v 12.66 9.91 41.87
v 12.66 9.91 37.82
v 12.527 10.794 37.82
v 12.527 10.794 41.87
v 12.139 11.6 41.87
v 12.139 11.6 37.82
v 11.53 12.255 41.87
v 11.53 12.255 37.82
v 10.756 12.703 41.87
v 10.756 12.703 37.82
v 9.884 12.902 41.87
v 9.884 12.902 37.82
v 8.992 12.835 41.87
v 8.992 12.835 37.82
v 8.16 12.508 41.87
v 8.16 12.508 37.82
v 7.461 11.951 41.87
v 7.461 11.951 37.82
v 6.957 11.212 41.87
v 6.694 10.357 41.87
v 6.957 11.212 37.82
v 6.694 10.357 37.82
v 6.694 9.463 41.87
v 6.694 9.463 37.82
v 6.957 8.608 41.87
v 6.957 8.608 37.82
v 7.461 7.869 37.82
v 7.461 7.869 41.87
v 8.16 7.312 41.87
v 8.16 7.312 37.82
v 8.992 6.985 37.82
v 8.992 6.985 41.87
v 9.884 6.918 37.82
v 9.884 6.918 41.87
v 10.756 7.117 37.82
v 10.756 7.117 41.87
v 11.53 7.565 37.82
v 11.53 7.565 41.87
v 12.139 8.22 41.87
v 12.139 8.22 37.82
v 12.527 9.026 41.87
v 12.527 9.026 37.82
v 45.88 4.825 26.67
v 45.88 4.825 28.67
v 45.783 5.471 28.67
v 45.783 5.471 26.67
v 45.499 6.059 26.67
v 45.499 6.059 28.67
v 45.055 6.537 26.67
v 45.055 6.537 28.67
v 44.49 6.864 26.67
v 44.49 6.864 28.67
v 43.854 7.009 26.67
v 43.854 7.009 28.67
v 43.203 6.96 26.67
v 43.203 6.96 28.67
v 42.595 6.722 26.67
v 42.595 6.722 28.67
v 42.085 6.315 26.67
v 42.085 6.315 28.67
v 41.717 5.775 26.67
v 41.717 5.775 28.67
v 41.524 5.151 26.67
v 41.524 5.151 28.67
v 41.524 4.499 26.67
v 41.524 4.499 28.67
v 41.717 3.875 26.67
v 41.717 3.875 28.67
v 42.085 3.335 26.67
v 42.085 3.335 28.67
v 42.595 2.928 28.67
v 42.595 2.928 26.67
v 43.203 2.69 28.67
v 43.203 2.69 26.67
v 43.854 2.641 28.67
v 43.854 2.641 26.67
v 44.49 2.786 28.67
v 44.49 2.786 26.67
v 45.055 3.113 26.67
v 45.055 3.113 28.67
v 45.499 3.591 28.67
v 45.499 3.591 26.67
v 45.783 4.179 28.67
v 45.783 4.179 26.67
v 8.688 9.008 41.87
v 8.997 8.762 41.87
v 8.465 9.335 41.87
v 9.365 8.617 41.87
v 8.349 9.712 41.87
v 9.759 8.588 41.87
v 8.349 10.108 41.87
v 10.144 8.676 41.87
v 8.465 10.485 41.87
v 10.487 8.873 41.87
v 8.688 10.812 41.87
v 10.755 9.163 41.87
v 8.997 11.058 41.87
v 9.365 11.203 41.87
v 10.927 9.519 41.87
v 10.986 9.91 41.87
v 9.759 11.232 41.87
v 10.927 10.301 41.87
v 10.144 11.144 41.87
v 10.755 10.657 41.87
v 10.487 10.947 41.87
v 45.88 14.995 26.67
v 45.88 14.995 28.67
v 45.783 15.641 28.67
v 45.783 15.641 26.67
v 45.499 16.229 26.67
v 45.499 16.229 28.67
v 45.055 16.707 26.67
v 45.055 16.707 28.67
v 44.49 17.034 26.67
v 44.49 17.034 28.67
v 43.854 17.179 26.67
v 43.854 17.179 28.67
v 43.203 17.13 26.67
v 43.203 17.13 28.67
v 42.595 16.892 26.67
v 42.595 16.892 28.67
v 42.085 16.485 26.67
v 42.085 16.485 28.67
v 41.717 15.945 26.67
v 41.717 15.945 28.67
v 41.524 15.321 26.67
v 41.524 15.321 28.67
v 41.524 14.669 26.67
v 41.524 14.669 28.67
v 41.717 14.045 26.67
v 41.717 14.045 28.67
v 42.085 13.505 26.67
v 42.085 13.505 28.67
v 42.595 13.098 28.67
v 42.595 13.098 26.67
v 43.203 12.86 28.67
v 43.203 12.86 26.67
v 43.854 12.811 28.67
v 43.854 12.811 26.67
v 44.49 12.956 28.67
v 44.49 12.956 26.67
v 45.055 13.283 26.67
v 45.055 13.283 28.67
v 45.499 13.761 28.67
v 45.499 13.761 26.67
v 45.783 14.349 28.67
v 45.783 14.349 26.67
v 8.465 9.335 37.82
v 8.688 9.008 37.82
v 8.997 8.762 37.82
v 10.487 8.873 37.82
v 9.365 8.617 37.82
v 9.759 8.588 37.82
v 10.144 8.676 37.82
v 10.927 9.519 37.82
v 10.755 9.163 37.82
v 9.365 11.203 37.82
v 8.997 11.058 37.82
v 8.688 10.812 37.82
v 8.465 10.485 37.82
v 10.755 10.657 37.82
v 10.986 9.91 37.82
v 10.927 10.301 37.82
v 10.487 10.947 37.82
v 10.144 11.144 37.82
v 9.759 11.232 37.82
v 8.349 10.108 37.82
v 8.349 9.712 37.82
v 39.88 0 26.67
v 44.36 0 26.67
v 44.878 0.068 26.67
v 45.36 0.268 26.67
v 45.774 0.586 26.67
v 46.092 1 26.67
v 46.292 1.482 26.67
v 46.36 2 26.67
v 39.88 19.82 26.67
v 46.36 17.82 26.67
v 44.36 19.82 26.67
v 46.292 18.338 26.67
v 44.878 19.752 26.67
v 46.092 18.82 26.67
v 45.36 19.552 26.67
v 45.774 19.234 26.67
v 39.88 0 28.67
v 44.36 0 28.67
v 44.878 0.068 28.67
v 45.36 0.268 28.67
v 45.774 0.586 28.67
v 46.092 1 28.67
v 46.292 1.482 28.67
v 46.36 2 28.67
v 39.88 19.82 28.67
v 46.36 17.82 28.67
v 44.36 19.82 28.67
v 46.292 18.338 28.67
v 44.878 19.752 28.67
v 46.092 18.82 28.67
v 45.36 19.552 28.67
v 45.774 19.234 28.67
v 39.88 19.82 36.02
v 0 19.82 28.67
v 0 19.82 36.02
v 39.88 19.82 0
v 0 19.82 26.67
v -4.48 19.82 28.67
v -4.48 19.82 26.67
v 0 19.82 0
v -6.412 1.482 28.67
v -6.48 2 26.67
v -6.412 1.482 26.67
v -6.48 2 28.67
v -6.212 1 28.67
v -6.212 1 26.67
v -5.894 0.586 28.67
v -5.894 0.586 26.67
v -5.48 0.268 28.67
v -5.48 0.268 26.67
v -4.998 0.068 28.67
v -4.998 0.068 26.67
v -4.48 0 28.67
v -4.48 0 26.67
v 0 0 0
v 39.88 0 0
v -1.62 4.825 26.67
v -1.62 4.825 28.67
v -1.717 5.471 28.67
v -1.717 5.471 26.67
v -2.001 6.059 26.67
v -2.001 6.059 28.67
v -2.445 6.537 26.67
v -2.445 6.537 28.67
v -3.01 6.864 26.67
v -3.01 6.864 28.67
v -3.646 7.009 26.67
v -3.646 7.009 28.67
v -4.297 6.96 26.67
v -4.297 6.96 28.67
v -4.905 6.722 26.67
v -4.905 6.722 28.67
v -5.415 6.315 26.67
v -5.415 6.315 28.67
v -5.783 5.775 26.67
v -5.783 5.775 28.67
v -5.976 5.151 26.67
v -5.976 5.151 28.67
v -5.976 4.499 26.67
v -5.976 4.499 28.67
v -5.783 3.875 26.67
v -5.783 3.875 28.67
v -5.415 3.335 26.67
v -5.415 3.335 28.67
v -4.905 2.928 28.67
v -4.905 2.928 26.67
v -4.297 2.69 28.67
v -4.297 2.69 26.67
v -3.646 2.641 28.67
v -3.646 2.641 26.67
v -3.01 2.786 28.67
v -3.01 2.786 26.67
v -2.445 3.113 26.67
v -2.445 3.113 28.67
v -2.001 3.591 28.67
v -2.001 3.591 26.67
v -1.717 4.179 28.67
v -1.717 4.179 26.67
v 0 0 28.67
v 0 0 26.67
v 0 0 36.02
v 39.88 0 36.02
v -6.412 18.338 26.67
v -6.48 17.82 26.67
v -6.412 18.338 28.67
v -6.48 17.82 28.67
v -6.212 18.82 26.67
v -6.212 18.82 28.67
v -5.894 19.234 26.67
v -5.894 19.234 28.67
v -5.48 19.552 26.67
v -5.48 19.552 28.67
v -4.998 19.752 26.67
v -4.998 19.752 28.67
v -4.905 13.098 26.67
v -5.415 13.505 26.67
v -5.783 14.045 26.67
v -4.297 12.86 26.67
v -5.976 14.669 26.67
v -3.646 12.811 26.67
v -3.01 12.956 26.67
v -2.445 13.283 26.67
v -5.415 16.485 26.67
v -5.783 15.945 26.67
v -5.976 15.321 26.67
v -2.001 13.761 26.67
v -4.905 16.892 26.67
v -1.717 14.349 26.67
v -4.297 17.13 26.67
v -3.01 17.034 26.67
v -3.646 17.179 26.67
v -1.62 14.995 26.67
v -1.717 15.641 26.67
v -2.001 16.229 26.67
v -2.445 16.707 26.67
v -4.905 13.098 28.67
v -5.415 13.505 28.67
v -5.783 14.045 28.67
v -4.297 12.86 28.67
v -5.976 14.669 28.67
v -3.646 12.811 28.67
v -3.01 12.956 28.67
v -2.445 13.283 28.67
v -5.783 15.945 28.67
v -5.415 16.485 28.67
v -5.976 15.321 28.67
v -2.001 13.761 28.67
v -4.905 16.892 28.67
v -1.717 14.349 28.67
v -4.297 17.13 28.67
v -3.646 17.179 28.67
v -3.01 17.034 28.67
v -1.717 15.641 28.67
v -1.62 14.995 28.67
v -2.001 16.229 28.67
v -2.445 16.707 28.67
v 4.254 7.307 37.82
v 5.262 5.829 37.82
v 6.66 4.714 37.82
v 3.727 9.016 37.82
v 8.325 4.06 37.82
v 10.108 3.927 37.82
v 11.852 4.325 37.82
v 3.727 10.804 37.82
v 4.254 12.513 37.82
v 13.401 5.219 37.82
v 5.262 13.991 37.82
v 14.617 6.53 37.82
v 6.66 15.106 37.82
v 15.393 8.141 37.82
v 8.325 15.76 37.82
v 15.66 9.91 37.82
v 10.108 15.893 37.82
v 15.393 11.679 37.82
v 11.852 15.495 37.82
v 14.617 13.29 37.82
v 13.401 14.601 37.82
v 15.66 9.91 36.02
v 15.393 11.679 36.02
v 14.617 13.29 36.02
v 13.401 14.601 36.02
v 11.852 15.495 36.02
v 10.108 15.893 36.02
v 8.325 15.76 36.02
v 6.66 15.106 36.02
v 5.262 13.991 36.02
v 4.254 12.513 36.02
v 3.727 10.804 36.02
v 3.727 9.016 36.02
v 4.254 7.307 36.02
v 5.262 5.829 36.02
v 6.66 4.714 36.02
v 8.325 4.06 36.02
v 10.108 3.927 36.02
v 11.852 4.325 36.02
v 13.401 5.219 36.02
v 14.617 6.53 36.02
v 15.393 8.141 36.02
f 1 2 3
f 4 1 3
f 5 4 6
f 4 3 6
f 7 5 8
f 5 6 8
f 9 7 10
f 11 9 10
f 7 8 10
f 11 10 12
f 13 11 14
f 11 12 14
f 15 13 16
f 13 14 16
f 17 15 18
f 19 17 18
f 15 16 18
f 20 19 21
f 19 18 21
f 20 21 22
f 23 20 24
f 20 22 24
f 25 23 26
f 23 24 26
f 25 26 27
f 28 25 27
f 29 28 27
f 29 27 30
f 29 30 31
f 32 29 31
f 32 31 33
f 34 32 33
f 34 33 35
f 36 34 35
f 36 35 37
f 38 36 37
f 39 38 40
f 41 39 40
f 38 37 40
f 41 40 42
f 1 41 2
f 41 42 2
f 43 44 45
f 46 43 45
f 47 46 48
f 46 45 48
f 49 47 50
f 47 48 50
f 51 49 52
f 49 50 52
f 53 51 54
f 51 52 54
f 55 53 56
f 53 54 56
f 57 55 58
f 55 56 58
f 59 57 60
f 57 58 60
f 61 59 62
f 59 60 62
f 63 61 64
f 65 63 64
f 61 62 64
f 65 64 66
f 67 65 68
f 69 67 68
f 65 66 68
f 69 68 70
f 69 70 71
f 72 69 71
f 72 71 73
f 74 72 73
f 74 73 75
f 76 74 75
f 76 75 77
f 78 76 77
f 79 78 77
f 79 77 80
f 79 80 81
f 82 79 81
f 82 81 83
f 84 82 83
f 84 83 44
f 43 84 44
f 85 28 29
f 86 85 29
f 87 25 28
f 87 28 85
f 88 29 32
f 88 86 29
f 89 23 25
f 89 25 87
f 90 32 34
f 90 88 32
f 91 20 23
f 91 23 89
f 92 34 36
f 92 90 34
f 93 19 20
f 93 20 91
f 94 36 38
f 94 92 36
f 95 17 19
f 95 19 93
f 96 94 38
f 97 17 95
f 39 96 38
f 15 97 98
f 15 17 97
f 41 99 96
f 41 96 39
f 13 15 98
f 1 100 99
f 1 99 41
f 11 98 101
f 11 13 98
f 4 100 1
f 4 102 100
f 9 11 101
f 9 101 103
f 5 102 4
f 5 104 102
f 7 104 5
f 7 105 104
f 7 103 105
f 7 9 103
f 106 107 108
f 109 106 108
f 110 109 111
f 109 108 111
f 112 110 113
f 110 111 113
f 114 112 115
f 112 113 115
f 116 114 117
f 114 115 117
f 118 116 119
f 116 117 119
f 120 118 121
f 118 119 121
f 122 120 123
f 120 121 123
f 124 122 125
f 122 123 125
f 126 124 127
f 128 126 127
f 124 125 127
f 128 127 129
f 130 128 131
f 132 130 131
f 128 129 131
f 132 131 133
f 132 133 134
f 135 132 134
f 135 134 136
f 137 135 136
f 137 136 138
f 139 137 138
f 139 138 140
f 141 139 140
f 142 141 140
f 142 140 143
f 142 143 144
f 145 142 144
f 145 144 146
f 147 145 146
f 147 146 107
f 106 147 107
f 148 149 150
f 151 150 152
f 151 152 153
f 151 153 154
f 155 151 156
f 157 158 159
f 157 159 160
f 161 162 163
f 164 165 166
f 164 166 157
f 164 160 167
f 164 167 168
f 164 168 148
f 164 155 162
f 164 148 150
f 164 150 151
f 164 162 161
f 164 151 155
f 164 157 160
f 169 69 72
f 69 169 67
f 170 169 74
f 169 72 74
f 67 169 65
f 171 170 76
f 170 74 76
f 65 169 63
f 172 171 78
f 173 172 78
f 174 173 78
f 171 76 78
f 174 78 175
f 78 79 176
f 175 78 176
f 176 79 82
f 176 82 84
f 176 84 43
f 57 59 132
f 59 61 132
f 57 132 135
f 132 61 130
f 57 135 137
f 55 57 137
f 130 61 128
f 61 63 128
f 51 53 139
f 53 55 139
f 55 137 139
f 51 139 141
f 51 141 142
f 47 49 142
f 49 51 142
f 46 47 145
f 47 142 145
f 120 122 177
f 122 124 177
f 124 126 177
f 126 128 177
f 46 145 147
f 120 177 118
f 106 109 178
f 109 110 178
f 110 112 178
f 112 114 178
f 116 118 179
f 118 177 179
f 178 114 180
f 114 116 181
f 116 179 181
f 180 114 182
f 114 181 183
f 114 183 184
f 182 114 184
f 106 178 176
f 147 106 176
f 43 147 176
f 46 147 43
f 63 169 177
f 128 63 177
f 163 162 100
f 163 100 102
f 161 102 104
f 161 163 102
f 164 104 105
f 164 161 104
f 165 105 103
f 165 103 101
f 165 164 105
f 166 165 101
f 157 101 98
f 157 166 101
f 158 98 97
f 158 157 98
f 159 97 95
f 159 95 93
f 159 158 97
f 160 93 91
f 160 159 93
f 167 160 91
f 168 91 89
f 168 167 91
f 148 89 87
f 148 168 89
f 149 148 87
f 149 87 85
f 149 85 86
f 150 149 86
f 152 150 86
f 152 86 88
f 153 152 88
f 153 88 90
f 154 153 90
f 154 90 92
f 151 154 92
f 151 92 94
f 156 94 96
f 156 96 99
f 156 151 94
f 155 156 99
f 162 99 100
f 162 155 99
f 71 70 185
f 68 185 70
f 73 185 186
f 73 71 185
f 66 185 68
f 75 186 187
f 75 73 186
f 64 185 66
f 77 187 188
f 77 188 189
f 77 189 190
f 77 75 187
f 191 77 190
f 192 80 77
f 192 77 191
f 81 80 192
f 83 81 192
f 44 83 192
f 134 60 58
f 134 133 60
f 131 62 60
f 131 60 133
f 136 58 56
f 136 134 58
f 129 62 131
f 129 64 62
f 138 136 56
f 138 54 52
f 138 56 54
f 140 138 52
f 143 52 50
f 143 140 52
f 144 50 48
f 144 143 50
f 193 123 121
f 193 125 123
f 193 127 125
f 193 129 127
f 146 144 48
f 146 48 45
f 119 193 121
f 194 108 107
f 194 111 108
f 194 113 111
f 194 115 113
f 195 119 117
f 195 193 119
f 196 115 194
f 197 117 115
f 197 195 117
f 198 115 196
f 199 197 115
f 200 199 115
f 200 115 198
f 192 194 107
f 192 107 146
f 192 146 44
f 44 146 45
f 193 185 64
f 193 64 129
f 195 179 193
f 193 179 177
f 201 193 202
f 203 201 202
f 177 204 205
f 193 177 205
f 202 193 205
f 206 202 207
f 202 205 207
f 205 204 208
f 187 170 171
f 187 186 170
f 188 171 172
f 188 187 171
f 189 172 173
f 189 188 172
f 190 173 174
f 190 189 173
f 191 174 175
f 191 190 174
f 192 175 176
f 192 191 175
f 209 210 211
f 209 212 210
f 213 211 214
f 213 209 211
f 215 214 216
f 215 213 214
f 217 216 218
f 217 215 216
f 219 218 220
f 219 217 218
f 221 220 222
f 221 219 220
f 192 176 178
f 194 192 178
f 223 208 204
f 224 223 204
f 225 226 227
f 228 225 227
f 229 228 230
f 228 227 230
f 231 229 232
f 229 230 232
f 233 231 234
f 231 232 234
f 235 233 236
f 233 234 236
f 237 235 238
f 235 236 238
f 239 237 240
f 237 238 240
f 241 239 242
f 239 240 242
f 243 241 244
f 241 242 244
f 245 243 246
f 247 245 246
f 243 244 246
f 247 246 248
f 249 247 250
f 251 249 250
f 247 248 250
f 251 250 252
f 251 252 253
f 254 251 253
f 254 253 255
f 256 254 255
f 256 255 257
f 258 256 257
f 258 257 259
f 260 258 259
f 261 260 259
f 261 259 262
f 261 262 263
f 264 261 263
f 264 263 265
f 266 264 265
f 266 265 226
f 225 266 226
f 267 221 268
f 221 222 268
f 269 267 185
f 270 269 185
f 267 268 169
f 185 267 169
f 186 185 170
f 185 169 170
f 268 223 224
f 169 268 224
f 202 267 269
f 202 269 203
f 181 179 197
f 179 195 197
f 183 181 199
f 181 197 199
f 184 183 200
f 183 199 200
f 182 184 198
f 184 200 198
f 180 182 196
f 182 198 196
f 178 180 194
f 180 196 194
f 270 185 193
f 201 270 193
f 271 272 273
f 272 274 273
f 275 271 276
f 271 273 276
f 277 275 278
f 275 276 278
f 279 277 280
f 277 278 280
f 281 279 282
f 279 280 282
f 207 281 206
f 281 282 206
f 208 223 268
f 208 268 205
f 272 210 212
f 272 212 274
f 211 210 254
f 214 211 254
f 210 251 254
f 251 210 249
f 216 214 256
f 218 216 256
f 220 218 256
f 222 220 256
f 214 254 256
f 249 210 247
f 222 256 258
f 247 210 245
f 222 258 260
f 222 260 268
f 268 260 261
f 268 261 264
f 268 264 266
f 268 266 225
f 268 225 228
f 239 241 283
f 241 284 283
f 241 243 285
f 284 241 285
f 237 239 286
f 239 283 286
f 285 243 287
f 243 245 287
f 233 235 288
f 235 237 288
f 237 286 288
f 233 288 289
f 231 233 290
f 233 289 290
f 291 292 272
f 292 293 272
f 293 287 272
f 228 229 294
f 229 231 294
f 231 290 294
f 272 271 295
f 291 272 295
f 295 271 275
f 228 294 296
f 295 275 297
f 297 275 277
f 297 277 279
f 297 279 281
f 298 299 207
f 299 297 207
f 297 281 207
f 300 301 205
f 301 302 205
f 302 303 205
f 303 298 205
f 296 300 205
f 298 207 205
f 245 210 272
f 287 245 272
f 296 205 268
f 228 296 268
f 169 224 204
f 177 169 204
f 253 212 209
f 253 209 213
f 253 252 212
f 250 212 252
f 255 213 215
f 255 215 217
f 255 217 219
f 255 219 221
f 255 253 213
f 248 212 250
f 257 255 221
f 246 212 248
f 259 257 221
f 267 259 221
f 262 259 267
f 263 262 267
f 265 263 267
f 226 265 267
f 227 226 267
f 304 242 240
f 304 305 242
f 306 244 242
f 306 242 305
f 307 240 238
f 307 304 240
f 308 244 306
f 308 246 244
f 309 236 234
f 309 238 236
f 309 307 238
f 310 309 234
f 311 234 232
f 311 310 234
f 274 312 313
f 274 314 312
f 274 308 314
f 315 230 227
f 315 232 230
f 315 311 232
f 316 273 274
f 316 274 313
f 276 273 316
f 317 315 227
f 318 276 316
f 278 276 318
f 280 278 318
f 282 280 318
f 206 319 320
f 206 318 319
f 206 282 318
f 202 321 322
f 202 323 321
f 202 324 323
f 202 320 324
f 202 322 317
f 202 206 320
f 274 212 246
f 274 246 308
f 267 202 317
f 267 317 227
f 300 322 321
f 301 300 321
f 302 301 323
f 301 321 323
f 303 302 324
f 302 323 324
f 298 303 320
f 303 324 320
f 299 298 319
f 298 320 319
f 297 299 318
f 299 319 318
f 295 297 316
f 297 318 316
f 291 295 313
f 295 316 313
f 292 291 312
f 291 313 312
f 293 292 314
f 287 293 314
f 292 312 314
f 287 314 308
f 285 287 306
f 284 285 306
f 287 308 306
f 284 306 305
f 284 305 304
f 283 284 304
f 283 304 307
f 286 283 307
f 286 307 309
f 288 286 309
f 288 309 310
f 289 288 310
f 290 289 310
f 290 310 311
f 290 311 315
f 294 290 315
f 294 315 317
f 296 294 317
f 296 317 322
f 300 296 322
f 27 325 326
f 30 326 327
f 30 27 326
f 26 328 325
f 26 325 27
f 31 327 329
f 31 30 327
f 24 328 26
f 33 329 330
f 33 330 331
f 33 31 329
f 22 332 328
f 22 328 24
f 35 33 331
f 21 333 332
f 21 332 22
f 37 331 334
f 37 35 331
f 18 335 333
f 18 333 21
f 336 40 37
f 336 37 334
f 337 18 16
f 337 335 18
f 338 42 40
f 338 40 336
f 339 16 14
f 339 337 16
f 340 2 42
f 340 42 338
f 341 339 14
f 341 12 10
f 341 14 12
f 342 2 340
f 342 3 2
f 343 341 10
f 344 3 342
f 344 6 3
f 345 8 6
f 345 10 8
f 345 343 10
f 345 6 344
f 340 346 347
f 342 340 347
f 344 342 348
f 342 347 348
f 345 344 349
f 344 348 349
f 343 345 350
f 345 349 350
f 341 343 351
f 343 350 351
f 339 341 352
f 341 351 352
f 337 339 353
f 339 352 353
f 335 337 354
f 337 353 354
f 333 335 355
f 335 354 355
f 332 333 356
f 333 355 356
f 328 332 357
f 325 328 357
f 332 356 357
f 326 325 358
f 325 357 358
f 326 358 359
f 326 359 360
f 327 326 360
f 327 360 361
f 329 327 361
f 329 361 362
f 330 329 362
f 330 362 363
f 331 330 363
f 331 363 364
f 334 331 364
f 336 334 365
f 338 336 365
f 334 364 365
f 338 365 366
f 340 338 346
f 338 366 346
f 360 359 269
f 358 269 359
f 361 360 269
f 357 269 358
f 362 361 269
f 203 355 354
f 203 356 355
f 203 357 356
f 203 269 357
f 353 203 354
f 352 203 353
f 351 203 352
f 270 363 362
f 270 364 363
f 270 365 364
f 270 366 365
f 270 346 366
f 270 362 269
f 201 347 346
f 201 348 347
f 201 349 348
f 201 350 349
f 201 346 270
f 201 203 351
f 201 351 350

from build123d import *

# Parameters (mm, degrees)
F0_W      = 39.88
F0_H      = 19.82
F1_DEPTH  = 26.67
F2_W      = 6.48
F2_H      = 19.82
F2_W_2    = 39.88
F3_DEPTH  = 2
F4_W      = 39.88
F4_H      = 19.82
F5_DEPTH  = 7.35
F6_R      = 6
F7_DEPTH  = 1.8
F8_R      = 3
F8_R_2    = 1.3258580477
F9_DEPTH  = 4.05
F10_R     = 2.19
F11_DEPTH = 25
F12_R     = 2


with BuildPart() as f1:
    # F0 (on Top) → F1 (new body)
    with BuildSketch(Plane.XY):
        with Locations((19.94, 9.91)):
            Rectangle(F0_W, F0_H)
    extrude(amount=F1_DEPTH)

    # F2 (on face) → F3 (join)
    with BuildSketch(Plane.XY.offset(26.67)):
        with Locations((-3.24, 9.91)):
            Rectangle(F2_W, F2_H)
        with Locations((19.94, 9.91)):
            Rectangle(F2_W_2, F2_H)
        with Locations((43.12, 9.91)):
            Rectangle(F2_W, F2_H)
    extrude(amount=F3_DEPTH)

    # F4 (on face) → F5 (join)
    with BuildSketch(Plane.XY.offset(28.67)):
        with Locations((19.94, 9.91)):
            Rectangle(F4_W, F4_H)
    extrude(amount=F5_DEPTH)

    # F6 (on face) → F7 (join)
    with BuildSketch(Plane.XY.offset(36.02)):
        with Locations((9.66, 9.91)):
            Circle(F6_R)
    extrude(amount=F7_DEPTH)

    # F8 (on face) → F9 (join)
    with BuildSketch(Plane.XY.offset(37.82)):
        with Locations((9.66, 9.91)):
            Circle(F8_R)
        with Locations((9.66, 9.91)):
            Circle(F8_R_2, mode=Mode.SUBTRACT)
    extrude(amount=F9_DEPTH)

    # F10 (on face) → F11 (cut)
    with BuildSketch(Plane.XY.offset(28.67)):
        with Locations((-3.81, 4.825)):
            Circle(F10_R)
        with Locations((-3.81, 14.995)):
            Circle(F10_R)
        with Locations((43.69, 4.825)):
            Circle(F10_R)
        with Locations((43.69, 14.995)):
            Circle(F10_R)
    extrude(amount=-F11_DEPTH, mode=Mode.SUBTRACT)

    # F12
    f12_edges = [f1.edges().sort_by_distance(p)[0] for p in [
        (-6.48, 19.82, 27.67),
        (46.36, 19.82, 27.67),
        (46.36, 0, 27.67),
        (-6.48, 0, 27.67),
    ]]
    fillet(f12_edges, radius=F12_R)


solid = f1.part
